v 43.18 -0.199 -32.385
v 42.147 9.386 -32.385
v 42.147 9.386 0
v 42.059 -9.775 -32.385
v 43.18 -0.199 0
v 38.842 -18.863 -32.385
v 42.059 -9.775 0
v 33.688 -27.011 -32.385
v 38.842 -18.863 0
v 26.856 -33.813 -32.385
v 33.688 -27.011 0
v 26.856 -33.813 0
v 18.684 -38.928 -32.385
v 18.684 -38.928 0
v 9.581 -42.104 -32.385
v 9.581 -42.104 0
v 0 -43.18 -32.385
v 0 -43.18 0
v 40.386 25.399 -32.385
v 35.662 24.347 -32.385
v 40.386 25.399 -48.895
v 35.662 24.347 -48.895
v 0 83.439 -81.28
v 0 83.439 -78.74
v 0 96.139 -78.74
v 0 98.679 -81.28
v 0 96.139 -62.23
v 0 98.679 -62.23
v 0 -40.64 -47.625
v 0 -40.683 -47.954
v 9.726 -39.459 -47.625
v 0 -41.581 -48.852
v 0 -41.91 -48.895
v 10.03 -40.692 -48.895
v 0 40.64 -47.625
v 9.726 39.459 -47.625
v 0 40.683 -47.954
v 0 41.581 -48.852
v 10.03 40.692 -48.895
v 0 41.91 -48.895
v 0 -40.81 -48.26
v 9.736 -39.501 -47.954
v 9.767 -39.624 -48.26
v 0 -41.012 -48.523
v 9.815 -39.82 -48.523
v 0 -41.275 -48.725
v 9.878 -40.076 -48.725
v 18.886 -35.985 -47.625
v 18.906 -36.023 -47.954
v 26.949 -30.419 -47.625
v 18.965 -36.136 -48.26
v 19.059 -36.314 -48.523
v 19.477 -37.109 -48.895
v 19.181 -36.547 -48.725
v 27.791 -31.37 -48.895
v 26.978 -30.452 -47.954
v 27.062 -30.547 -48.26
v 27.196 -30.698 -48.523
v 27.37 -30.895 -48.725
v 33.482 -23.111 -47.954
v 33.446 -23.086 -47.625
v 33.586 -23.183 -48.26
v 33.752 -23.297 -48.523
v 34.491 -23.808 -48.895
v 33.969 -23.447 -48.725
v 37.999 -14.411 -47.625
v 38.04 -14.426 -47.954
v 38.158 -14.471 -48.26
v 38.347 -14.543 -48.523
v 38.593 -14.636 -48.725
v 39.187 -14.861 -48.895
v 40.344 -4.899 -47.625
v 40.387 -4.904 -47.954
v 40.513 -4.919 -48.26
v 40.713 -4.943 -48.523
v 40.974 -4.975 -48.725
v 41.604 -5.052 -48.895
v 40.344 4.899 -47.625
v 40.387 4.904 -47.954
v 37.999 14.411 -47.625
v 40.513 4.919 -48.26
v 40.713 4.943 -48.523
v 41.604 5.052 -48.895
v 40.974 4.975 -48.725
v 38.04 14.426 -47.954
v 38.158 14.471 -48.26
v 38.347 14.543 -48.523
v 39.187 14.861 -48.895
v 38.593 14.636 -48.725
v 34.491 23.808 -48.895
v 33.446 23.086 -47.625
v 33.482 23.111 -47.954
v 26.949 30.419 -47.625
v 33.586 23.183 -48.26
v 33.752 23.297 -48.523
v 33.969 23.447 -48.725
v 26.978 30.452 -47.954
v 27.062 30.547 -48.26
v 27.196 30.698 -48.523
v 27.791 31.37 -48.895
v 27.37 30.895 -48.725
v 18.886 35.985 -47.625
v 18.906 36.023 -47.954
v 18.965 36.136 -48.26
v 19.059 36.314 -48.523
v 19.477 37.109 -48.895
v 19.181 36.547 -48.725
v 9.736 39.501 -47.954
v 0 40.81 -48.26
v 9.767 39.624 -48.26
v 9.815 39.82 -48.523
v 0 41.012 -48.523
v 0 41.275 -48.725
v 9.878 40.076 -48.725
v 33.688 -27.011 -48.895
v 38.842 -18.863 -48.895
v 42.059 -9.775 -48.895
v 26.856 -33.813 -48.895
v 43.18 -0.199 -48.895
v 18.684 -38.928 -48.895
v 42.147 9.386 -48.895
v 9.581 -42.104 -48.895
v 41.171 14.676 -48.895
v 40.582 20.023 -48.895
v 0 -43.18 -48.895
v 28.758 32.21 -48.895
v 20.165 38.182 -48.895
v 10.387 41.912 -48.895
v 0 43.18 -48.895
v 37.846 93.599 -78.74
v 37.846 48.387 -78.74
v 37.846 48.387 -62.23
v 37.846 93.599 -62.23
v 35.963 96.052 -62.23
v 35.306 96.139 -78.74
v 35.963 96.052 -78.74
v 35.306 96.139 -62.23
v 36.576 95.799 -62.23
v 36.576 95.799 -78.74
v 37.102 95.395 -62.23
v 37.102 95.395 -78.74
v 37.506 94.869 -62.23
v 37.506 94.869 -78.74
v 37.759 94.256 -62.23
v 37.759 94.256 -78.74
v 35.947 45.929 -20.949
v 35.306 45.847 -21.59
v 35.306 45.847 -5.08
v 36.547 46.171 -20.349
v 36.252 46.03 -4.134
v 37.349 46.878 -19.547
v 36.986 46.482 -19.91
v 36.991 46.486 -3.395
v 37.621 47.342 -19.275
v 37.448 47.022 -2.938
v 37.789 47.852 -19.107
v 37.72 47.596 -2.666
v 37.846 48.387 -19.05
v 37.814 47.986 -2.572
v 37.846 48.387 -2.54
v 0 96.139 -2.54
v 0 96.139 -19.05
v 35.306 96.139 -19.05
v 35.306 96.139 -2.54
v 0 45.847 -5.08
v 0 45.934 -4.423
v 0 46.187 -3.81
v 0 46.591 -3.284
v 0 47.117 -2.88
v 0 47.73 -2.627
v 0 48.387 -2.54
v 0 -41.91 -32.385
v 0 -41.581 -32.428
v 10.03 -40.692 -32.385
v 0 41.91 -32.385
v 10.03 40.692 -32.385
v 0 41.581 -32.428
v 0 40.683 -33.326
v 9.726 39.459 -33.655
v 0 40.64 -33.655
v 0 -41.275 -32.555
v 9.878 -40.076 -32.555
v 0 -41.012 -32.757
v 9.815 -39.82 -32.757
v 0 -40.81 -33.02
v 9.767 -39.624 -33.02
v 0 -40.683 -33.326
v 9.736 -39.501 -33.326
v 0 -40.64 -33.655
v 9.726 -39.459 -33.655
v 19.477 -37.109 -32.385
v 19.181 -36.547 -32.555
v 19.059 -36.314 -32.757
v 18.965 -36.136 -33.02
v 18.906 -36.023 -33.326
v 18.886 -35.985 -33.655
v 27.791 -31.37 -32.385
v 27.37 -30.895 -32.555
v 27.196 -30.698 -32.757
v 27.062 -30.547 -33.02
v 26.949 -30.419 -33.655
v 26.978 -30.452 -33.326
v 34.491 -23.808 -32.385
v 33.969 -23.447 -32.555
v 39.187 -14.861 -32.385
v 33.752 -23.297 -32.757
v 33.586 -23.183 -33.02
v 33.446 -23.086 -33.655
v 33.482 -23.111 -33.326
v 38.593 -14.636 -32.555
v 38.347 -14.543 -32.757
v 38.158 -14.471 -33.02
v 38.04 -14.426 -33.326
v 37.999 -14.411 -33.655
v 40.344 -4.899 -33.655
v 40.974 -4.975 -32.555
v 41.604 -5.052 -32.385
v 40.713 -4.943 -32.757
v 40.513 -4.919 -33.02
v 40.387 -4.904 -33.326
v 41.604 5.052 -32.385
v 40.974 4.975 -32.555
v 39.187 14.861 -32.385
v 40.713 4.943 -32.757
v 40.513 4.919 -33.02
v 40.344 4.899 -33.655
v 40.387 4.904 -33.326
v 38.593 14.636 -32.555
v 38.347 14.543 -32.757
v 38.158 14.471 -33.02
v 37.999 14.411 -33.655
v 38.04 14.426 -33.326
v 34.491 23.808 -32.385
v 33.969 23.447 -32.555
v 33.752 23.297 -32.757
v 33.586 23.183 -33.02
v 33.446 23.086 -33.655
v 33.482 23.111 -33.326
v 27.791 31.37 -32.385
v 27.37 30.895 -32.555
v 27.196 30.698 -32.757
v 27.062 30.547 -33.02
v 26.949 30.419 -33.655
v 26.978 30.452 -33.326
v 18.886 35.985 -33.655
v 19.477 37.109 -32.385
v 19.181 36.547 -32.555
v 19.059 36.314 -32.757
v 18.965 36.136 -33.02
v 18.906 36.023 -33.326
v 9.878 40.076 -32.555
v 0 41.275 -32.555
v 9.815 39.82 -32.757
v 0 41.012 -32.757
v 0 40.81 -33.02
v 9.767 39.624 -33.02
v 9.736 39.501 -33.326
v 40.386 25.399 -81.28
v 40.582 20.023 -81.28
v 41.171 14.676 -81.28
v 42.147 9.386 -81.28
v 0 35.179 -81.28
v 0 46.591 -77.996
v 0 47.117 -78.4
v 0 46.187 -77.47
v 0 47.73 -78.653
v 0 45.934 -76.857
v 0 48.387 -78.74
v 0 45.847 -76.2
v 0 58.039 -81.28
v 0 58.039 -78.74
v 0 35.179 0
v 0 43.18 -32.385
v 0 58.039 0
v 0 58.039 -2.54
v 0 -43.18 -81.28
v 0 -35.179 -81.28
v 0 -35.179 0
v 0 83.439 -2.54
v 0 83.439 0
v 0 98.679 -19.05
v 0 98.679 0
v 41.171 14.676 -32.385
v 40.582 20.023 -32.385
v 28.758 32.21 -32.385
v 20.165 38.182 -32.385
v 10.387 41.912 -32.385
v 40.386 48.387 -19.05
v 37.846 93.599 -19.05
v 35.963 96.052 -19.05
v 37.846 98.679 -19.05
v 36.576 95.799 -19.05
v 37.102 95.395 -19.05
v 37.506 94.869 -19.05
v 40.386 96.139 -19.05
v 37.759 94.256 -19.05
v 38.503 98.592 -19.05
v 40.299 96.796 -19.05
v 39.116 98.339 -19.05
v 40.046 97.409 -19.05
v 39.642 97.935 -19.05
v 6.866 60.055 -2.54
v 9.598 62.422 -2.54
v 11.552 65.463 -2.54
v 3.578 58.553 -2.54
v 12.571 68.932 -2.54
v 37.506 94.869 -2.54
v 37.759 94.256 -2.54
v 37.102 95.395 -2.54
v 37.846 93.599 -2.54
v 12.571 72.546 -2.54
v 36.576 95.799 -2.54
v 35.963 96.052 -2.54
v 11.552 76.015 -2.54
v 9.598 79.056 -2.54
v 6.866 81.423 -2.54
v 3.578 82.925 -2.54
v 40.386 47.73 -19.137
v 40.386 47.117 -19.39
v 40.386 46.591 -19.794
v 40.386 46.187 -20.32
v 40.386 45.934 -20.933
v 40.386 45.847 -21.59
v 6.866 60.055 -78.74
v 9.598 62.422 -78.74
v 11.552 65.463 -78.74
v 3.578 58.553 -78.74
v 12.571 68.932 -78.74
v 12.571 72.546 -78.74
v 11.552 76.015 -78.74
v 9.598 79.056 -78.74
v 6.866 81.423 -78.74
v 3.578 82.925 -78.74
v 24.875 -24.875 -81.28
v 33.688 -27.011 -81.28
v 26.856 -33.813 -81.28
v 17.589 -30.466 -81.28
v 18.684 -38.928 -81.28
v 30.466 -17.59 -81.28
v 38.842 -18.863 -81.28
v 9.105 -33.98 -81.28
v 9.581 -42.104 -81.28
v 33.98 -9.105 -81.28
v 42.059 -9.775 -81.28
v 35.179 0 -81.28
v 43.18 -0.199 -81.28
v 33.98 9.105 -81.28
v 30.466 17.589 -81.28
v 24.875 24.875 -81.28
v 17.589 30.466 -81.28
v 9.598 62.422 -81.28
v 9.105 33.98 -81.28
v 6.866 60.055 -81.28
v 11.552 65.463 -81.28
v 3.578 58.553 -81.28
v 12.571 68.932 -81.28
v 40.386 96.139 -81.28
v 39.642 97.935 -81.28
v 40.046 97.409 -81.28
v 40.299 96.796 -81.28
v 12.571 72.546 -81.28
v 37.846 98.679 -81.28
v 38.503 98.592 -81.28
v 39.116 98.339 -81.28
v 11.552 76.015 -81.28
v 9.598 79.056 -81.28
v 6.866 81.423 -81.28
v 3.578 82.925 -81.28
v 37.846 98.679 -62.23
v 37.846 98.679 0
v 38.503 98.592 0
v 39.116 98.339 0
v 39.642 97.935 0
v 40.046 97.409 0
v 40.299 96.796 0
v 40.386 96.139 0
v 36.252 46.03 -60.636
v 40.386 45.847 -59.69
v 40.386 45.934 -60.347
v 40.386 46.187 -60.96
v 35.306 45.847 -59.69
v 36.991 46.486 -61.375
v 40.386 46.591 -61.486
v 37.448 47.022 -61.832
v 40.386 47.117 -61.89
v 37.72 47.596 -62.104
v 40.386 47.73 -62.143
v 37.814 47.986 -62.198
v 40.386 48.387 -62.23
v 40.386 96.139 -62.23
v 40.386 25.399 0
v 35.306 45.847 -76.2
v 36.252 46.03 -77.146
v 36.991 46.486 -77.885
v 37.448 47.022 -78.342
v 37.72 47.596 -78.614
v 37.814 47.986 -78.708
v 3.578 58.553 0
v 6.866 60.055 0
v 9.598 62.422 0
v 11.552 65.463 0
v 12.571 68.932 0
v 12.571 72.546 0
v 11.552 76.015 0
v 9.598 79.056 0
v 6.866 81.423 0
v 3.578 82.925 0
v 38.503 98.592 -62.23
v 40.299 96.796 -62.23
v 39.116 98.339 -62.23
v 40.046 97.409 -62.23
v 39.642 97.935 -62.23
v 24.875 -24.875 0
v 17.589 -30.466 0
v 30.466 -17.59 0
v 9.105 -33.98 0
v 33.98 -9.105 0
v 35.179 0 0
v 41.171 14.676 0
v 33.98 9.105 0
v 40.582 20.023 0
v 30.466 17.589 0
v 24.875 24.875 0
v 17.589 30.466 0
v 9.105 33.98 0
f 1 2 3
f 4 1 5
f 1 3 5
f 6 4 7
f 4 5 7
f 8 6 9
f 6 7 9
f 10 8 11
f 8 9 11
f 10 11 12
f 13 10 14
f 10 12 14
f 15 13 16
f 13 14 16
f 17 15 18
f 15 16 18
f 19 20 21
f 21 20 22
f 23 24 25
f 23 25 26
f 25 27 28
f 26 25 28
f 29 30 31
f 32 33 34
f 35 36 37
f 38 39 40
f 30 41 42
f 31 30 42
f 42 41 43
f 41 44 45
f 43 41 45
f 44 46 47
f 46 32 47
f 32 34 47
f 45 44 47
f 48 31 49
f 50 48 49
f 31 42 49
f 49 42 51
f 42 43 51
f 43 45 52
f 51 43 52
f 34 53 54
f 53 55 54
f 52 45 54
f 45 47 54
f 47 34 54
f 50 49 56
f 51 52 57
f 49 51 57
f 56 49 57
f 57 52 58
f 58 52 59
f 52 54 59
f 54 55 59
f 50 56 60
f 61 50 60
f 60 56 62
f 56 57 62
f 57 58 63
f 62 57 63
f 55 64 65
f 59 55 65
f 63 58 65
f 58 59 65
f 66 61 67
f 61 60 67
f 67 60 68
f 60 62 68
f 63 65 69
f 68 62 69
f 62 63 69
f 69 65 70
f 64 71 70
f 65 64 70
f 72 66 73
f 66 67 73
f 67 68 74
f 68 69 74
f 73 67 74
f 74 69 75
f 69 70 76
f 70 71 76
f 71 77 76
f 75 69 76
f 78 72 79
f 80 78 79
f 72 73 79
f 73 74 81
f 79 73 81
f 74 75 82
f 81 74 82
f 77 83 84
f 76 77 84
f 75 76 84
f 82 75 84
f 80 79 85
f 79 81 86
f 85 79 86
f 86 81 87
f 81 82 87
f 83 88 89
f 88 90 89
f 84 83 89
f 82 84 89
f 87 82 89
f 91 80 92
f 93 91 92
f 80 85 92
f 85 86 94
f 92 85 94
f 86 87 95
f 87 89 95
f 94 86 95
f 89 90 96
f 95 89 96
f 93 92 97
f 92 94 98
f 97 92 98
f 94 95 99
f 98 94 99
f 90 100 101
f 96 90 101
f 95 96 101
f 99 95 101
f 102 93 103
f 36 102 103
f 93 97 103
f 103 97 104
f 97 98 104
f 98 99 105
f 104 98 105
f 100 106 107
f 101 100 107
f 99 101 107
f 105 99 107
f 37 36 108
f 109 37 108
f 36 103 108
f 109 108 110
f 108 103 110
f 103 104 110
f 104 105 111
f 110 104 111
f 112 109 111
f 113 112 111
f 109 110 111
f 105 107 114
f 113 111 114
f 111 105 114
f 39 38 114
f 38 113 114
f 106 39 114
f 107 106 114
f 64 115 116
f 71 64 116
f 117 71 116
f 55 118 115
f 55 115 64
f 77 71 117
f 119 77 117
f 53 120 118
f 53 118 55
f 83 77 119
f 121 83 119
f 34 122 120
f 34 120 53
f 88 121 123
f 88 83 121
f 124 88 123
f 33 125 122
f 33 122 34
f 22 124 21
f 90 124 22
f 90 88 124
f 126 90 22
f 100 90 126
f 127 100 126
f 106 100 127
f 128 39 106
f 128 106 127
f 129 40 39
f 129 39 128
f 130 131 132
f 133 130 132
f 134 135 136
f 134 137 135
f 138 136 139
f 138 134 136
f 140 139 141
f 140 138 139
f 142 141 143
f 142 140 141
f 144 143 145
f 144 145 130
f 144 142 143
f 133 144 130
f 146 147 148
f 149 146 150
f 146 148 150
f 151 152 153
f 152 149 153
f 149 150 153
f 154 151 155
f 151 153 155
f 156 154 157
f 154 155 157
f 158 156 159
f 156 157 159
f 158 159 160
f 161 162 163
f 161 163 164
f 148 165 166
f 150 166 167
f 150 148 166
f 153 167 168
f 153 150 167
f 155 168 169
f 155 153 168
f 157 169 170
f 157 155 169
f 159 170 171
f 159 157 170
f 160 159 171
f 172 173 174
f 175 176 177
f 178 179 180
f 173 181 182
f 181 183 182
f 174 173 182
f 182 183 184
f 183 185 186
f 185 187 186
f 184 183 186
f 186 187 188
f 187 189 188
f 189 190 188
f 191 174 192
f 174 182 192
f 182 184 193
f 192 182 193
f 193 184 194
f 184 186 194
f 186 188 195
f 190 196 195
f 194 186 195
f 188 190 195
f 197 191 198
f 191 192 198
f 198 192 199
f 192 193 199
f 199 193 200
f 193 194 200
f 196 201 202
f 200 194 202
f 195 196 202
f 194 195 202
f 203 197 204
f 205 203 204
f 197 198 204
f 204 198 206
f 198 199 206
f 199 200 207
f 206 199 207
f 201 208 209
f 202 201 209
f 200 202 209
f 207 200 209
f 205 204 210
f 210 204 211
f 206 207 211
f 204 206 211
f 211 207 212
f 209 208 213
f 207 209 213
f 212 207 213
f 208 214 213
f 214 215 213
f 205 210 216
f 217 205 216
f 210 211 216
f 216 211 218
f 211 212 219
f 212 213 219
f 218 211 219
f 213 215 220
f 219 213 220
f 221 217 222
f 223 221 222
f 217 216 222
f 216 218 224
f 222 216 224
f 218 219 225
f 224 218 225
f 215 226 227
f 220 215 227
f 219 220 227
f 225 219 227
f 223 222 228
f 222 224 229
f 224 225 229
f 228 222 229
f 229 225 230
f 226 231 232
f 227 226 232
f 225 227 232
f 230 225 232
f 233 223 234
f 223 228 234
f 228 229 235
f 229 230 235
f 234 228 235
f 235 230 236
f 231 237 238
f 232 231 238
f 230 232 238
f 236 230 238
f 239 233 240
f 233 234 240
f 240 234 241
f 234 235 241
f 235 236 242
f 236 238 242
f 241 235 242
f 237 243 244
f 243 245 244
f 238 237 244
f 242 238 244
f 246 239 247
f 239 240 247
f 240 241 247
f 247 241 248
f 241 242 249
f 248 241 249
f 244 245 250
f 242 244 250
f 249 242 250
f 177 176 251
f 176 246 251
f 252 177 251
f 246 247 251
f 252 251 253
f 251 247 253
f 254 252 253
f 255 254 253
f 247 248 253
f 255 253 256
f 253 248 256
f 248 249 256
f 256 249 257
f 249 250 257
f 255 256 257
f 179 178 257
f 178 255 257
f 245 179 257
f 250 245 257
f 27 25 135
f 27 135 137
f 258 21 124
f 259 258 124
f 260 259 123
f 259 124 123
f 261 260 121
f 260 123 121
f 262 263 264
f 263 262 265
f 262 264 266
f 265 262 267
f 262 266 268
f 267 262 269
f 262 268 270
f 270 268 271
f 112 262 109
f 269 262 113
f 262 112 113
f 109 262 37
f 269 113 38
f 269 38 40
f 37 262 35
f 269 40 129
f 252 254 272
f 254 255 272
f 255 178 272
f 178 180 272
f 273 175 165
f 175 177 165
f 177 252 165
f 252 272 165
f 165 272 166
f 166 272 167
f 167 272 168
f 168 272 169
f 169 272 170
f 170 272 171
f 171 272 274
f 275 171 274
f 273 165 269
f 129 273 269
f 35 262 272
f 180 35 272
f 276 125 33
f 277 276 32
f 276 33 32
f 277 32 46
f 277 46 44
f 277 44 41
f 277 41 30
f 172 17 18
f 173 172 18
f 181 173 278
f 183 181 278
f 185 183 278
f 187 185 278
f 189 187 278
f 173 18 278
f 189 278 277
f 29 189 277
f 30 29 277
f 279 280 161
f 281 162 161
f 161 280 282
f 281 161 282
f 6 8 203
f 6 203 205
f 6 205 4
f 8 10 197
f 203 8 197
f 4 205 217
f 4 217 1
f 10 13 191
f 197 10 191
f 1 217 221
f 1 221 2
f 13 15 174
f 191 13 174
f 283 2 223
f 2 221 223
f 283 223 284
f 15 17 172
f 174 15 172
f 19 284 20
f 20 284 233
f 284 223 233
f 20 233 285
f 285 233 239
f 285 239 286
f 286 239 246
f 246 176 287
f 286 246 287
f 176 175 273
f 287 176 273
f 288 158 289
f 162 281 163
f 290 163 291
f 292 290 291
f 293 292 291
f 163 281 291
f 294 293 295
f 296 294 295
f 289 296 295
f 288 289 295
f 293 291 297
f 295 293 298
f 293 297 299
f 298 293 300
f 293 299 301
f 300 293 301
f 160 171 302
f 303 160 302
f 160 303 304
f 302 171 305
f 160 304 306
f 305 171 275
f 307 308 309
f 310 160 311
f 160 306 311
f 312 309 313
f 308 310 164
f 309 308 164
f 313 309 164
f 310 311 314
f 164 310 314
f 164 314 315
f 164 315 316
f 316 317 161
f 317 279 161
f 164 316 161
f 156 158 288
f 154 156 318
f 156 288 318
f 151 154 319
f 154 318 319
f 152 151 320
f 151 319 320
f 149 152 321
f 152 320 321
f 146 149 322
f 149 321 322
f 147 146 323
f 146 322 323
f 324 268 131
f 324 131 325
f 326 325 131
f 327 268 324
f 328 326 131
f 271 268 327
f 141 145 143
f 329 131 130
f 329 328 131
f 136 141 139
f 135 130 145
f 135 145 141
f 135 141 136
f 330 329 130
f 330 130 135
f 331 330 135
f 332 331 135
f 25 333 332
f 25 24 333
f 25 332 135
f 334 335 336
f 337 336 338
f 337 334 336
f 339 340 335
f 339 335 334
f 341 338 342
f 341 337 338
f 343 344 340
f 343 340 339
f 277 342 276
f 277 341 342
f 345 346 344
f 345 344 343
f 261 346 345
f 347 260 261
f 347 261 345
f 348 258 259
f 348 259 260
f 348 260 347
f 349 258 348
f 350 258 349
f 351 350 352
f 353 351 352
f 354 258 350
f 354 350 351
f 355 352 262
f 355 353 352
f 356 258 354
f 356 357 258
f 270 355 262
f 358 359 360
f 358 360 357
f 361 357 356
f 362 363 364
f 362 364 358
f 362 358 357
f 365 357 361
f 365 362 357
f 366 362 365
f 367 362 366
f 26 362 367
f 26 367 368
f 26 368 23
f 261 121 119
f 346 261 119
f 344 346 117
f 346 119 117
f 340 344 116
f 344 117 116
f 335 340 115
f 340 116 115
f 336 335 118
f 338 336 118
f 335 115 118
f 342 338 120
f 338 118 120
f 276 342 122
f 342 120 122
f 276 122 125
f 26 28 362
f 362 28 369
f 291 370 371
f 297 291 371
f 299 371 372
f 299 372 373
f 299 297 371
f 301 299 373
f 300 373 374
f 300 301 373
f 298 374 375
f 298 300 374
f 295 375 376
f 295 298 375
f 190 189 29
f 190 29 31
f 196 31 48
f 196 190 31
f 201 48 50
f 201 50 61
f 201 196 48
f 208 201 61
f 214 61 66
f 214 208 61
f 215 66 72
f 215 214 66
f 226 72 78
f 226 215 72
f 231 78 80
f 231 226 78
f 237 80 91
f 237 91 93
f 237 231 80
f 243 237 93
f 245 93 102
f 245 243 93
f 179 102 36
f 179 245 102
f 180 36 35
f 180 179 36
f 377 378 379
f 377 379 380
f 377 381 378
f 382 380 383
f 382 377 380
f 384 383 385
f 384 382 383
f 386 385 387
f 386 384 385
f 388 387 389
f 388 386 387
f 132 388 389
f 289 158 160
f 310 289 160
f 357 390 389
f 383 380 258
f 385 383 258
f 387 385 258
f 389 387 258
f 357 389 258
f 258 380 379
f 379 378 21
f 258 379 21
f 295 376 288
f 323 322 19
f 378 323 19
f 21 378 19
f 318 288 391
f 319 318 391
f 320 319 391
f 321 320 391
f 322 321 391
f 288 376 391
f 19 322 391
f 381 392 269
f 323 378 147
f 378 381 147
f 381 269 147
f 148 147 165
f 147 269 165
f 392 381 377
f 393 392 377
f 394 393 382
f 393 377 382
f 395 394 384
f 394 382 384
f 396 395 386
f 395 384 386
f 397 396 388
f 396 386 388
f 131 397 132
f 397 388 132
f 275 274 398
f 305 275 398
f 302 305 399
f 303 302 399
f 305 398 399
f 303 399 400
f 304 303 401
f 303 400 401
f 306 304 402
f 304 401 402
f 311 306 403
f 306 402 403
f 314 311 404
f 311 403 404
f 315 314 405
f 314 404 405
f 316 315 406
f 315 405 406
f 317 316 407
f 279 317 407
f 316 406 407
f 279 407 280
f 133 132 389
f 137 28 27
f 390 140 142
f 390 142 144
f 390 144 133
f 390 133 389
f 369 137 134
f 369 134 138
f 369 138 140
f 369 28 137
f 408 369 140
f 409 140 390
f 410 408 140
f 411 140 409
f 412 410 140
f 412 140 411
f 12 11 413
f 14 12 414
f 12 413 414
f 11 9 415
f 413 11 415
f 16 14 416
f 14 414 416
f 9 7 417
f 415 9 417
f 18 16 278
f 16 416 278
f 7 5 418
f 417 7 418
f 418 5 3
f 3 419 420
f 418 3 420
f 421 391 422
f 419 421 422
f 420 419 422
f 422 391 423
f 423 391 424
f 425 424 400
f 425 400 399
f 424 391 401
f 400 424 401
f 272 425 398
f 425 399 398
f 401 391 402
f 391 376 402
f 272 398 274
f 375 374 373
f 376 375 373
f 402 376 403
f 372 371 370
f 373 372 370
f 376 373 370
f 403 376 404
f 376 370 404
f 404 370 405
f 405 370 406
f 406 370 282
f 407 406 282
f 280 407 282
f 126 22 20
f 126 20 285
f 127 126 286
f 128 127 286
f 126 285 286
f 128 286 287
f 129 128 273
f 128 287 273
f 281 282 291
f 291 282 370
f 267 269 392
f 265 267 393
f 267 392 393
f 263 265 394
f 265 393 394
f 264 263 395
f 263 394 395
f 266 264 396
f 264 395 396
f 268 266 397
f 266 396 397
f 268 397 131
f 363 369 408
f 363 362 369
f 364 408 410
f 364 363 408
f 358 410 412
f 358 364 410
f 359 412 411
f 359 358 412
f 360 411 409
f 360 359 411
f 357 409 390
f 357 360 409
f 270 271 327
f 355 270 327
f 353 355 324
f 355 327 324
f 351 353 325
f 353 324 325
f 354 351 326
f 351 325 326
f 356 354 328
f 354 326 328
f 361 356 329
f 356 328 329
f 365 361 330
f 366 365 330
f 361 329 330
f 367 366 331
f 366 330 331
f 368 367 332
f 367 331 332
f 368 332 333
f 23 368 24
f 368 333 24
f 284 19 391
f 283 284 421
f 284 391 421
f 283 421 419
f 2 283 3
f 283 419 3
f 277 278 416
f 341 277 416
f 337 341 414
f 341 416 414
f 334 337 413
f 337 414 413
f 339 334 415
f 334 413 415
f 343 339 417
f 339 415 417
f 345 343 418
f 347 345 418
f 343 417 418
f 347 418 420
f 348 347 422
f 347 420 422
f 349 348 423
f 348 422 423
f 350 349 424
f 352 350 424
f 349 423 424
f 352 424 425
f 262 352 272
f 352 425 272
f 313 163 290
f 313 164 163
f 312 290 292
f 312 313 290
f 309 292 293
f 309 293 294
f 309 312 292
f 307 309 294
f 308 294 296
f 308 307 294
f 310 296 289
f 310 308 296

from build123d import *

# Parameters (mm, degrees)
BOSS_EXTRUDE1_DEPTH            = 81.28
SKETCH3_W                      = 76.2
SKETCH3_H                      = 50.292
CUT_EXTRUDE1_DEPTH             = 37.846
SKETCH4_W                      = 40.386
SKETCH4_H                      = 43.18
CUT_EXTRUDE2_DEPTH             = 52.832
FILLET1_R                      = 2.54
FILLET2_R                      = 2.54
FILLET3_R                      = 2.54
FILLET4_R                      = 2.54
SKETCH7_W                      = 16.51
SKETCH7_H                      = 2.54
CUT_EXTRUDE4_REACH             = 54.566
SKETCH8_W                      = 16.51
SKETCH8_H                      = 16.012242806
CUT_EXTRUDE4_DIRECTION_2_DEPTH = 2.54
FILLET5_R                      = 1.27


with BuildPart() as part:
    # Sketch1 → Boss-Extrude1 (new body)
    with BuildSketch(Plane.XY):
        with BuildLine():
            Line((0, 52.959), (0, 58.039))
            ThreePointArc((0, 58.039), (12.7, 70.739), (0, 83.439))
            Line((0, 83.439), (0, 98.679))
            Line((0, 98.679), (40.386, 98.679))
            Line((40.386, 98.679), (40.386, 25.398729968))
            ThreePointArc((40.386, 25.398729968), (40.827682914, 17.344312358), (42.147434783, 9.386487162))
            ThreePointArc((42.147434783, 9.386487162), (33.688432107, -27.011144777), (0, -43.18))
            Line((0, -43.18), (0, -35.179))
            ThreePointArc((0, -35.179), (35.179, 0), (0, 35.179))
            Line((0, 35.179), (0, 52.959))
        make_face()
    extrude(amount=-BOSS_EXTRUDE1_DEPTH)

    # Sketch3 → Cut-Extrude1 (cut)
    with BuildSketch(Plane.ZY):
        with Locations((-40.64, 70.993)):
            Rectangle(SKETCH3_W, SKETCH3_H)
    extrude(amount=-CUT_EXTRUDE1_DEPTH, mode=Mode.SUBTRACT)

    # Sketch4 → Cut-Extrude2 (cut)
    with BuildSketch(Plane(origin=(0, 98.679, 0), x_dir=(1, 0, 0), z_dir=(0, 1, 0))):
        with Locations((20.193, 40.64)):
            Rectangle(SKETCH4_W, SKETCH4_H)
    extrude(amount=-CUT_EXTRUDE2_DEPTH, mode=Mode.SUBTRACT)

    # Fillet1
    fillet1_edges = [part.edges().sort_by_distance(p)[0] for p in [
        (18.923, 45.847, -78.74),
        (18.923, 45.847, -2.54),
        (37.846, 45.847, -10.795),
        (37.846, 45.847, -70.485),
    ]]
    fillet(fillet1_edges, radius=FILLET1_R)

    # Fillet2
    fillet2_edges = [part.edges().sort_by_distance(p)[0] for p in [
        (37.846, 96.139, -70.485),
        (37.846, 96.139, -10.795),
    ]]
    fillet(fillet2_edges, radius=FILLET2_R)

    # Fillet3
    fillet3_edges = [part.edges().sort_by_distance(p)[0] for p in [
        (36.576, 45.847, -19.05),
        (36.576, 45.847, -62.23),
    ]]
    fillet(fillet3_edges, radius=FILLET3_R)

    # Fillet4
    fillet4_edges = [part.edges().sort_by_distance(p)[0] for p in [
        (40.386, 98.679, -71.755),
        (40.386, 98.679, -9.525),
    ]]
    fillet(fillet4_edges, radius=FILLET4_R)

    # Sketch7 → Cut-Revolve2 (revolve, cut)
    with BuildSketch(Plane.ZY):
        with Locations((-40.64, -41.91)):
            Rectangle(SKETCH7_W, SKETCH7_H)
    revolve(axis=Axis((0, 0, -81.28), (0, 0, 1)), mode=Mode.SUBTRACT)

    # Sketch8 → Cut-Extrude4 (cut, up to next)
    with BuildSketch(Plane(origin=(42.147434783, 9.386487162, 0), x_dir=(0, 0, -1), z_dir=(0.976086957, 0.217380435, 0)), mode=Mode.PRIVATE) as cut_extrude4_sk1:
        with Locations((40.64, 8.006121403)):
            Rectangle(SKETCH8_W, SKETCH8_H)
    cut_extrude4_tool1 = extrude(cut_extrude4_sk1.sketch, amount=-CUT_EXTRUDE4_REACH, mode=Mode.PRIVATE) & part.part
    add(cut_extrude4_tool1.solids().sort_by_distance((40.407061, 17.201158, -40.64))[0], mode=Mode.SUBTRACT)

    # Sketch8 → Cut-Extrude4 direction 2 (cut)
    with BuildSketch(Plane(origin=(42.147434783, 9.386487162, 0), x_dir=(0, 0, -1), z_dir=(0.976086957, 0.217380435, 0))):
        with Locations((40.64, 8.006121403)):
            Rectangle(SKETCH8_W, SKETCH8_H)
    extrude(amount=CUT_EXTRUDE4_DIRECTION_2_DEPTH, mode=Mode.SUBTRACT)

    # Fillet5
    fillet5_edges = [part.edges().sort_by_distance(p)[0] for p in [
        (40.64, 0, -48.895),
        (40.64, 0, -32.385),
    ]]
    fillet(fillet5_edges, radius=FILLET5_R)


solid = part.part
